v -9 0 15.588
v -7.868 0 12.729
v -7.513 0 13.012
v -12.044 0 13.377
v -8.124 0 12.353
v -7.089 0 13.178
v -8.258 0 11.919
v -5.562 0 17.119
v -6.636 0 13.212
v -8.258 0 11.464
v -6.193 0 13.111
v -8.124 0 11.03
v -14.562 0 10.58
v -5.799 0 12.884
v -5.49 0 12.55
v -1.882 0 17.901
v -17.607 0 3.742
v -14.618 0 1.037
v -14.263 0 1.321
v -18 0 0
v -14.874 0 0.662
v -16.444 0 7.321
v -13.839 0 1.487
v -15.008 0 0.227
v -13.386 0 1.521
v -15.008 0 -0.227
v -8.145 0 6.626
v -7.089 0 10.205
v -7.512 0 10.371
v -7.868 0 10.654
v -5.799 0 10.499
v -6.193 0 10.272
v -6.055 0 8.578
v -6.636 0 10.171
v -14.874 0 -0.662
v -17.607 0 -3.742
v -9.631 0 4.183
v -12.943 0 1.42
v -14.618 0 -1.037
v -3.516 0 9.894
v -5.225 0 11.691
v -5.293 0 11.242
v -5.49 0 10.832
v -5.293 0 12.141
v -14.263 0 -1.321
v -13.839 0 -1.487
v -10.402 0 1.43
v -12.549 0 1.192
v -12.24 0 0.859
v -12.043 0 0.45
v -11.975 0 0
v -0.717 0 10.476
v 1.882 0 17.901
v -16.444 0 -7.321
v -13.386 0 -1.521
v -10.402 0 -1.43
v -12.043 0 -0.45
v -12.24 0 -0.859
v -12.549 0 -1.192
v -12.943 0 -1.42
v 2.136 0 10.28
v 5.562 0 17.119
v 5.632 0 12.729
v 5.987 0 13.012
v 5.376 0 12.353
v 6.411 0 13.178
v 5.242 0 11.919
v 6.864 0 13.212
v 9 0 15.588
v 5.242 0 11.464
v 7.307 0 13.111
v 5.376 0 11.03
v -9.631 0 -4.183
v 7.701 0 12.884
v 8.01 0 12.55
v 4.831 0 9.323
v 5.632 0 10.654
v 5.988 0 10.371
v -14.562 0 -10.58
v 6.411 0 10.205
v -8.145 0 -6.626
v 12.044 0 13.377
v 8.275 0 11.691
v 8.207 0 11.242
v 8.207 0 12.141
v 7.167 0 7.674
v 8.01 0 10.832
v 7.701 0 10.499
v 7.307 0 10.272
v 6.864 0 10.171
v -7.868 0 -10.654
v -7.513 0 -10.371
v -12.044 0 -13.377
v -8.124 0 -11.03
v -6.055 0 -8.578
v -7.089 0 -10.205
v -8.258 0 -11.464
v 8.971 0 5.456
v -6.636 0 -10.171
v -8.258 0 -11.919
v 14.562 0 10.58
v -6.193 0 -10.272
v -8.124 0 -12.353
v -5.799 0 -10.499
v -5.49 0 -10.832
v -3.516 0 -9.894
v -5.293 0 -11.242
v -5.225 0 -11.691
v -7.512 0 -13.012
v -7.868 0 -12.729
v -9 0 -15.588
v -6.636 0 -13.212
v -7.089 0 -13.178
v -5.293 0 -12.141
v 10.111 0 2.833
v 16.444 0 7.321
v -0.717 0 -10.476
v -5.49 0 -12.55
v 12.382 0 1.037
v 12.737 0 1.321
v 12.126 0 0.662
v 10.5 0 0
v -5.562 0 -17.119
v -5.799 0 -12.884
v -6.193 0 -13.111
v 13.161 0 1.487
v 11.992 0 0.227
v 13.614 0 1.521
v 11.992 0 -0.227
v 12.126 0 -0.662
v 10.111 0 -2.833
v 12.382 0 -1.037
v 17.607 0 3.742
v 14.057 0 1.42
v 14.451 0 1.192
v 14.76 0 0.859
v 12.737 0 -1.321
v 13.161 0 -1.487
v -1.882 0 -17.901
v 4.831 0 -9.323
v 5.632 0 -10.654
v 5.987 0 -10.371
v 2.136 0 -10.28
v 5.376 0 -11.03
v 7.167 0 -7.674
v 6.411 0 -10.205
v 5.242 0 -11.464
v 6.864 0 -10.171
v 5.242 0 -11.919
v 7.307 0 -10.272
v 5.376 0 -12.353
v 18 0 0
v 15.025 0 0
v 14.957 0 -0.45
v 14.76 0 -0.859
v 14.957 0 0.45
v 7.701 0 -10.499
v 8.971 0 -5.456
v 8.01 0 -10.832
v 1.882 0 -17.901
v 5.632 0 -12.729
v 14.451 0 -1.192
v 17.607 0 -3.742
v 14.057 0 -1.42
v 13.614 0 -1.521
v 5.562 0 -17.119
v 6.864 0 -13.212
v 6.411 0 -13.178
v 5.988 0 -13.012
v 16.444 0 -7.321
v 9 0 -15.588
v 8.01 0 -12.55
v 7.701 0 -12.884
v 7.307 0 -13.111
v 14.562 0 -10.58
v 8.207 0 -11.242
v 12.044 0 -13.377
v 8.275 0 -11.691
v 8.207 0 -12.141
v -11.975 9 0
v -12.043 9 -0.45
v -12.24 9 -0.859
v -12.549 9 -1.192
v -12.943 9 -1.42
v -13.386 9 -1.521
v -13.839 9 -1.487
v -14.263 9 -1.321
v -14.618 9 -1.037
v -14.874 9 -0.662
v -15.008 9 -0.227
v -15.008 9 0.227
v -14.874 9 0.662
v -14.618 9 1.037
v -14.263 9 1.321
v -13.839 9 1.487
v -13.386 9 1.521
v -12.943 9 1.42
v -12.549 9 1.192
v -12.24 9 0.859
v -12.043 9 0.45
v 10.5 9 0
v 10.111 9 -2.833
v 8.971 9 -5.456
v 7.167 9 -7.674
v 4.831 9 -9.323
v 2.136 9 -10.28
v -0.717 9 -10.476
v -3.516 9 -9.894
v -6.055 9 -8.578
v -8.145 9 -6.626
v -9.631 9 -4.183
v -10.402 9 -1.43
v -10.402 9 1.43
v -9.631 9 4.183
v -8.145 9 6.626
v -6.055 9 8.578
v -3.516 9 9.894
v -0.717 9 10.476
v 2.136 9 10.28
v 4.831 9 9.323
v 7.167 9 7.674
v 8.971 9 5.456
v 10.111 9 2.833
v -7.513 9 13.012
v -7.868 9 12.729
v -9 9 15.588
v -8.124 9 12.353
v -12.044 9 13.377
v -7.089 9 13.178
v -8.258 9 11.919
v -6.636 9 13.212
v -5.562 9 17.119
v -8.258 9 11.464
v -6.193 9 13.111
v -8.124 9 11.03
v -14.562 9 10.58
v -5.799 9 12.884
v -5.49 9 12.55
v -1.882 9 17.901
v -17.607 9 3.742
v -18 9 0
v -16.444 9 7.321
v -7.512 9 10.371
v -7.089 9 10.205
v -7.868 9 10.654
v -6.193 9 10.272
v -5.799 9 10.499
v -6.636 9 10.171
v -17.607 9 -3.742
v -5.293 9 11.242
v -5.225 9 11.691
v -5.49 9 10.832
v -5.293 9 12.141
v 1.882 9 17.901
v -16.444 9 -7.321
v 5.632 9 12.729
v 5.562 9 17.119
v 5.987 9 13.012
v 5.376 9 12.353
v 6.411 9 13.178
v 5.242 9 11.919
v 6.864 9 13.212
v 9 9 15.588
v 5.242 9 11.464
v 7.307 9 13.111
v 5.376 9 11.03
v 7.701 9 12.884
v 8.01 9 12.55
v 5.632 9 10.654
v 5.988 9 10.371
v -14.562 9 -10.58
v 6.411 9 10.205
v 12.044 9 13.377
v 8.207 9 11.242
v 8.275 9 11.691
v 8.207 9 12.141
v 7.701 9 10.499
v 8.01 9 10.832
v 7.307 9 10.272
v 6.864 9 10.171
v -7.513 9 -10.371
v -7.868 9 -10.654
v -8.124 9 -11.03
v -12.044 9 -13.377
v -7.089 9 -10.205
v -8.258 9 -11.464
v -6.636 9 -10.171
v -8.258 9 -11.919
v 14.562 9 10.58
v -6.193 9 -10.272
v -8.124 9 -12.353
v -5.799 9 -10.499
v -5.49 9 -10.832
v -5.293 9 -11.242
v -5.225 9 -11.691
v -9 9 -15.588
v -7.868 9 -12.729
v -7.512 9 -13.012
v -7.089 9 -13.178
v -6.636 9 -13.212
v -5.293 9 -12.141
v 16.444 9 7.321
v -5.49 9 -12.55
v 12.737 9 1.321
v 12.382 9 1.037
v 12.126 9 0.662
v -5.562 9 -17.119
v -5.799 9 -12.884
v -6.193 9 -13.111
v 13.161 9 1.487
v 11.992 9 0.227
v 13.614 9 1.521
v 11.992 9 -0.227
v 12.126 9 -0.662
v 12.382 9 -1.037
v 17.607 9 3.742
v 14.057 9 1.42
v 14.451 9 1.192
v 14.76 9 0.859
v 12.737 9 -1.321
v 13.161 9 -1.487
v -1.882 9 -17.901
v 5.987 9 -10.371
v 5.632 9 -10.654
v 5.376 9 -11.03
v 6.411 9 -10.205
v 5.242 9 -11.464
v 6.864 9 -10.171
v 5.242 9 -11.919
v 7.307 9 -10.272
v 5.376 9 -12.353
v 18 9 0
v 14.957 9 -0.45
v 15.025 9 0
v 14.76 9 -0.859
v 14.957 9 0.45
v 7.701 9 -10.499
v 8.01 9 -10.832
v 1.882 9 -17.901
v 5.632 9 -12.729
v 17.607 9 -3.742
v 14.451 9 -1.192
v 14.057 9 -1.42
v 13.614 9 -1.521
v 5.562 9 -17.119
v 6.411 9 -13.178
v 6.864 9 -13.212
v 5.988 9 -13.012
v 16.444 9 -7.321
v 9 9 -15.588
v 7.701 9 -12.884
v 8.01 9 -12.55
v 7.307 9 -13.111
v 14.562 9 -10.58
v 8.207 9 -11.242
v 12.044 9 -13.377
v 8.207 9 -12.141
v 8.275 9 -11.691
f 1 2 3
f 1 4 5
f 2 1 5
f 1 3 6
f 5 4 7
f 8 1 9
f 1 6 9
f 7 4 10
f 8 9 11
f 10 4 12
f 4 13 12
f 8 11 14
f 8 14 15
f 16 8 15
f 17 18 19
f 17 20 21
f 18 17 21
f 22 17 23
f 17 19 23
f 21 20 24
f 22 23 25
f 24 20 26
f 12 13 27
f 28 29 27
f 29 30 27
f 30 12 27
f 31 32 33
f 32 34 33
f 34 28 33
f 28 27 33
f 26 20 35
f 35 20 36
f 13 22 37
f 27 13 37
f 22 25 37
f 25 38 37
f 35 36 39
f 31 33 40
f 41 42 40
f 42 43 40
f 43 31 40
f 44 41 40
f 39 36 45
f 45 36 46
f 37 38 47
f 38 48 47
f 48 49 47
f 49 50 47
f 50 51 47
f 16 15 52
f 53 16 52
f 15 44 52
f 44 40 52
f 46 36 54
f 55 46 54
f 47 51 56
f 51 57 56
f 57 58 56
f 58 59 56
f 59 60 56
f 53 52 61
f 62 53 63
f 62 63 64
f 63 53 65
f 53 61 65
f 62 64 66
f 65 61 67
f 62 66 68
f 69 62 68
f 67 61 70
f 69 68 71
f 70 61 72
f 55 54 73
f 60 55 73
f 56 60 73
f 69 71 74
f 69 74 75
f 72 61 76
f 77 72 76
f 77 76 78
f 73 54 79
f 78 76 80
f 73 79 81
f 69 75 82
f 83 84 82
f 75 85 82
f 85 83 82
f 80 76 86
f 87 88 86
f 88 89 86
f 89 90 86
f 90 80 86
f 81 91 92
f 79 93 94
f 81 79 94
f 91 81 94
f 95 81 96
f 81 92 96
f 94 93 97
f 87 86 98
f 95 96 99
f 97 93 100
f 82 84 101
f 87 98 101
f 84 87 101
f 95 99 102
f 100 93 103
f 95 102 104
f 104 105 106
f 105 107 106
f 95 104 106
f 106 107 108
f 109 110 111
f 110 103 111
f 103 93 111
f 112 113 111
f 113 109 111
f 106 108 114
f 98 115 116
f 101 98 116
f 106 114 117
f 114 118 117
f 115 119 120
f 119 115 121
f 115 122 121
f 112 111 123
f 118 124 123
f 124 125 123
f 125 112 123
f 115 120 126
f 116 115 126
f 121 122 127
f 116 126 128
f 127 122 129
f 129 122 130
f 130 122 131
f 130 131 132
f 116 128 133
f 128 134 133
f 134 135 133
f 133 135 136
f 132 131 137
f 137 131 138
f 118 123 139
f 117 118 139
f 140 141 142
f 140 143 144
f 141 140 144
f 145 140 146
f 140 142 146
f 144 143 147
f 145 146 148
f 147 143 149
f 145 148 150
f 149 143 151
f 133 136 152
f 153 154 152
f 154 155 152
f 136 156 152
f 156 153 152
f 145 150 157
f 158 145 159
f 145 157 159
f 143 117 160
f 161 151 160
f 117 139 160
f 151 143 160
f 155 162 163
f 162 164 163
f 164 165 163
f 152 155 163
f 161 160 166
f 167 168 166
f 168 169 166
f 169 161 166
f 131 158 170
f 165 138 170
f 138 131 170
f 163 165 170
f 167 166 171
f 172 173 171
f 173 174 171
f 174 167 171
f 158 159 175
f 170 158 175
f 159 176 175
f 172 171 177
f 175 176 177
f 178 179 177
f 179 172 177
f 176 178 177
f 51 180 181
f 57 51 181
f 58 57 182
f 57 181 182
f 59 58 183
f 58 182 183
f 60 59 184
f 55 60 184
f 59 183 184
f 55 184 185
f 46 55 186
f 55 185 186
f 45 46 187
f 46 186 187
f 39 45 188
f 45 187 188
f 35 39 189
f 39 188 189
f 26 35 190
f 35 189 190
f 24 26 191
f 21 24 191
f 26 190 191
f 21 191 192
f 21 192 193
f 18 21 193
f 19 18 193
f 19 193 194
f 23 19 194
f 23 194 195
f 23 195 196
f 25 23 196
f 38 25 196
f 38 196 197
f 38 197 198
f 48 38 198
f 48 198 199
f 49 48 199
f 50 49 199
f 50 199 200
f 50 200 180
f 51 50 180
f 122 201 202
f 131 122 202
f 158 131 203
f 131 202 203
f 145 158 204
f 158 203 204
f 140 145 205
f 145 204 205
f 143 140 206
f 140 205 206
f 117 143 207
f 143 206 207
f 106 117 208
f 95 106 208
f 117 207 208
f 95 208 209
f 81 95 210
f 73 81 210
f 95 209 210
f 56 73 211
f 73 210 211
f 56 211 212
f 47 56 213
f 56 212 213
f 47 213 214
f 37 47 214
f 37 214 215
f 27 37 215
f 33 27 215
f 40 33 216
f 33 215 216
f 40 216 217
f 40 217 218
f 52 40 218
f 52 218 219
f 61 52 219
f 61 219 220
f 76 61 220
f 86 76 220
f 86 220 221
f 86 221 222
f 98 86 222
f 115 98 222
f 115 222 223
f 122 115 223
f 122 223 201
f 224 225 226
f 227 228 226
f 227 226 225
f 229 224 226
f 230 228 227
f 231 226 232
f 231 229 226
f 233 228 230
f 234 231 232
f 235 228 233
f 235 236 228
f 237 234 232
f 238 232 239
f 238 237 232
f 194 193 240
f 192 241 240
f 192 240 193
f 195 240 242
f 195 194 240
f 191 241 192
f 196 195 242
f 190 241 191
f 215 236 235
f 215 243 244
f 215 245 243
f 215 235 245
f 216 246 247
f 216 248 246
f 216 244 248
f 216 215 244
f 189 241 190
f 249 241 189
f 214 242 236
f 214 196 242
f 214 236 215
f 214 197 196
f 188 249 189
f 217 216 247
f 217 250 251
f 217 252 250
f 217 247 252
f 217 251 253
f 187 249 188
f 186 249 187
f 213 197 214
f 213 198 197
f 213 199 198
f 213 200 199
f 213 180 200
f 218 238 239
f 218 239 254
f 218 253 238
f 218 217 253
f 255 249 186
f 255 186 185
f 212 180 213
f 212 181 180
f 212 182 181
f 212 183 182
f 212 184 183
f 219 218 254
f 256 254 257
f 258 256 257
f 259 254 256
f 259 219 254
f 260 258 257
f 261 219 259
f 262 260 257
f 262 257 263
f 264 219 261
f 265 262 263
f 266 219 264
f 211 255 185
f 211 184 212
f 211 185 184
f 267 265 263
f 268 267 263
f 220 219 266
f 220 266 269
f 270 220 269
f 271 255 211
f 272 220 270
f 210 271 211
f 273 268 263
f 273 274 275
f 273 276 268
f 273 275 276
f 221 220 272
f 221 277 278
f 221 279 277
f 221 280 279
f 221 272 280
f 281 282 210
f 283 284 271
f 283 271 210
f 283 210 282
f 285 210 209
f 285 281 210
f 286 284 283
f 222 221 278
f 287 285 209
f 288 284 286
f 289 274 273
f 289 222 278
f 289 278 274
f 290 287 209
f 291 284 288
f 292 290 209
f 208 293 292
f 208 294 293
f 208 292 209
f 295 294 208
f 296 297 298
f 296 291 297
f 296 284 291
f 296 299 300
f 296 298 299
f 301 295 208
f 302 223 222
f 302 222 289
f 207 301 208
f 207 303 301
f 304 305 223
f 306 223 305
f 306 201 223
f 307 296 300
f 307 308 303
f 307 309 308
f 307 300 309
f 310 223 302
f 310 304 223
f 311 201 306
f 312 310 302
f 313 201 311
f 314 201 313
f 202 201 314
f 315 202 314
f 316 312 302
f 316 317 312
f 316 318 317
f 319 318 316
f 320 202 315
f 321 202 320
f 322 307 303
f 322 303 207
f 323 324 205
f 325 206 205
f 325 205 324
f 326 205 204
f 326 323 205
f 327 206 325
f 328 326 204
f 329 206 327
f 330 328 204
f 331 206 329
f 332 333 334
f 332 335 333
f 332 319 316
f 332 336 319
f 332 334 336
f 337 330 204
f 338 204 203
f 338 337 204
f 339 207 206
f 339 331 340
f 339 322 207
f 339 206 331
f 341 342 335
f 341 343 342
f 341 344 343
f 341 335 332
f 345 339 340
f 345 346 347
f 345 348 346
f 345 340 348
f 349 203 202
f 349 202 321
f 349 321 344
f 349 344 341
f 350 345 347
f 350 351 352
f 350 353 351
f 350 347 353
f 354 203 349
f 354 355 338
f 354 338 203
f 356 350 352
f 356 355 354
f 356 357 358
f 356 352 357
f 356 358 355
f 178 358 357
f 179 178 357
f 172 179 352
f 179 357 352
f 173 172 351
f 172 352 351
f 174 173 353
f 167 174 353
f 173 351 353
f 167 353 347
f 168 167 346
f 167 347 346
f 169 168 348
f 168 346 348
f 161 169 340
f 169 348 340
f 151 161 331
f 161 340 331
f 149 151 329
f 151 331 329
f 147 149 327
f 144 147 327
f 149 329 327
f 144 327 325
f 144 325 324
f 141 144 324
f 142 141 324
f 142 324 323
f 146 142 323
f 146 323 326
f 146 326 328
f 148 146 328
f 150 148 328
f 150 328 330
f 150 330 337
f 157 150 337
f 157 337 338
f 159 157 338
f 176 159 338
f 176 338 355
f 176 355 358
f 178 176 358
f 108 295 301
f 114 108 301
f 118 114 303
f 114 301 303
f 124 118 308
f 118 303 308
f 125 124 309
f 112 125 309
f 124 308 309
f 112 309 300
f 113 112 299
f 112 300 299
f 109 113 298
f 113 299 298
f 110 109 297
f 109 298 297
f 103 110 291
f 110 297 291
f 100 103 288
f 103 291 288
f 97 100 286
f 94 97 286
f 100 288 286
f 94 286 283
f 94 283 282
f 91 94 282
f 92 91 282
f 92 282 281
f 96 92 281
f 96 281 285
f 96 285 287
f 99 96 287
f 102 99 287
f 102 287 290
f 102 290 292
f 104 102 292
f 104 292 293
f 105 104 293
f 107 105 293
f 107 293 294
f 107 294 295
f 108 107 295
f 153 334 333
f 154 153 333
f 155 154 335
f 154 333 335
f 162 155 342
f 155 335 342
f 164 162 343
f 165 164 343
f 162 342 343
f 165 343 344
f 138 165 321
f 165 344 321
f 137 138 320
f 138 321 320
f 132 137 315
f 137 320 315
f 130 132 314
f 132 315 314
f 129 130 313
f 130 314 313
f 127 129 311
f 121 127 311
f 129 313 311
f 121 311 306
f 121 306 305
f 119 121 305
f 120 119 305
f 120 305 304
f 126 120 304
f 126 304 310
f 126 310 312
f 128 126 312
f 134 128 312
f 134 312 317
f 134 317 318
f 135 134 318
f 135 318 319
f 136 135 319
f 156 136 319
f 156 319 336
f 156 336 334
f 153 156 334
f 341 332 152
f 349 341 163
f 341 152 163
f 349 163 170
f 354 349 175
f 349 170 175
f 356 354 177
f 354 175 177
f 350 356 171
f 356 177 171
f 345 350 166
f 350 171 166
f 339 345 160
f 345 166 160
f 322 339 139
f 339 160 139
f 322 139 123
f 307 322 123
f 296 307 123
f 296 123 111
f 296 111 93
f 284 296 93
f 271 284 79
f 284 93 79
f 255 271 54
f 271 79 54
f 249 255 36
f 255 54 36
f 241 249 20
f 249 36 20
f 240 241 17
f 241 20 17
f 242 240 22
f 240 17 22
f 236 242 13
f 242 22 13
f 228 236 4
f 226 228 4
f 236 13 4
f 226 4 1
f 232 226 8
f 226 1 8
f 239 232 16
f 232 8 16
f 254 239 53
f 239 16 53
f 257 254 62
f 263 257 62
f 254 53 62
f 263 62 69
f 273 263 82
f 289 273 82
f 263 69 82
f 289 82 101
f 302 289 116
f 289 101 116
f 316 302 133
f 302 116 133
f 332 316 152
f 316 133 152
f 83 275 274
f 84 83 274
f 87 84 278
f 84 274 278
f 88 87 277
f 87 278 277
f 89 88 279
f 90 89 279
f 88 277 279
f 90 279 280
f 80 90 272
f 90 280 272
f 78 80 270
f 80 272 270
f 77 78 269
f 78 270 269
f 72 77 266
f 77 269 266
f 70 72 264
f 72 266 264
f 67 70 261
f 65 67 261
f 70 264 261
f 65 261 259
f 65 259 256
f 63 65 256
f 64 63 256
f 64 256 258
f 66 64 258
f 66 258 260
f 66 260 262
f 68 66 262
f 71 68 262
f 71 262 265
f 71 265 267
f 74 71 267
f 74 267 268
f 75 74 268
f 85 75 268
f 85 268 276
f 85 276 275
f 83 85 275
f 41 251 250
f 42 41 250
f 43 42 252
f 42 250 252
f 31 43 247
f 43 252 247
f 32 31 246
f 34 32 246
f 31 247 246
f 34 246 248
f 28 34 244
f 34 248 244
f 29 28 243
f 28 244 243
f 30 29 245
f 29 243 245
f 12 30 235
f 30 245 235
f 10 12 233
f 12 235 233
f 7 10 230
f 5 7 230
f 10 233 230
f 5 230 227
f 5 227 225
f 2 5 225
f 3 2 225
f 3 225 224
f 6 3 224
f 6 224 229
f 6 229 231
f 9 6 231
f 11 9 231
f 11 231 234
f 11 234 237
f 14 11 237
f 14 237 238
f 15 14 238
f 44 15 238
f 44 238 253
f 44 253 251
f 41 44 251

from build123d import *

# Parameters (mm, degrees)
SKETCH_1_R          = 18
EXTRUDE_1_DEPTH     = 9
SKETCH_2_R          = 1.525
CUT_EXTRUDE_1_DEPTH = 10
SKETCH_3_R          = 10.5
CUT_EXTRUDE_2_DEPTH = 10


with BuildPart() as part:
    # 草图1 → 凸台-拉伸1 (new body)
    with BuildSketch(Plane(origin=(0, 0, 0), x_dir=(1, 0, 0), z_dir=(0, 1, 0))):
        Circle(SKETCH_1_R)
    extrude(amount=EXTRUDE_1_DEPTH)

    # 草图2 → 切除-拉伸1 (cut, through all)
    with BuildSketch(Plane(origin=(0, 9, 0), x_dir=(1, 0, 0), z_dir=(0, 1, 0))):
        with Locations((13.5, 0)):
            Circle(SKETCH_2_R)
        with Locations((6.75, -11.691342951)):
            Circle(SKETCH_2_R)
        with Locations((-6.75, -11.691342951)):
            Circle(SKETCH_2_R)
        with Locations((-13.5, 0)):
            Circle(SKETCH_2_R)
        with Locations((-6.75, 11.691342951)):
            Circle(SKETCH_2_R)
        with Locations((6.75, 11.691342951)):
            Circle(SKETCH_2_R)
    extrude(amount=-CUT_EXTRUDE_1_DEPTH, mode=Mode.SUBTRACT)

    # 草图3 → 切除-拉伸2 (cut, through all)
    with BuildSketch(Plane(origin=(0, 9, 0), x_dir=(1, 0, 0), z_dir=(0, 1, 0))):
        Circle(SKETCH_3_R)
    extrude(amount=-CUT_EXTRUDE_2_DEPTH, mode=Mode.SUBTRACT)


solid = part.part
